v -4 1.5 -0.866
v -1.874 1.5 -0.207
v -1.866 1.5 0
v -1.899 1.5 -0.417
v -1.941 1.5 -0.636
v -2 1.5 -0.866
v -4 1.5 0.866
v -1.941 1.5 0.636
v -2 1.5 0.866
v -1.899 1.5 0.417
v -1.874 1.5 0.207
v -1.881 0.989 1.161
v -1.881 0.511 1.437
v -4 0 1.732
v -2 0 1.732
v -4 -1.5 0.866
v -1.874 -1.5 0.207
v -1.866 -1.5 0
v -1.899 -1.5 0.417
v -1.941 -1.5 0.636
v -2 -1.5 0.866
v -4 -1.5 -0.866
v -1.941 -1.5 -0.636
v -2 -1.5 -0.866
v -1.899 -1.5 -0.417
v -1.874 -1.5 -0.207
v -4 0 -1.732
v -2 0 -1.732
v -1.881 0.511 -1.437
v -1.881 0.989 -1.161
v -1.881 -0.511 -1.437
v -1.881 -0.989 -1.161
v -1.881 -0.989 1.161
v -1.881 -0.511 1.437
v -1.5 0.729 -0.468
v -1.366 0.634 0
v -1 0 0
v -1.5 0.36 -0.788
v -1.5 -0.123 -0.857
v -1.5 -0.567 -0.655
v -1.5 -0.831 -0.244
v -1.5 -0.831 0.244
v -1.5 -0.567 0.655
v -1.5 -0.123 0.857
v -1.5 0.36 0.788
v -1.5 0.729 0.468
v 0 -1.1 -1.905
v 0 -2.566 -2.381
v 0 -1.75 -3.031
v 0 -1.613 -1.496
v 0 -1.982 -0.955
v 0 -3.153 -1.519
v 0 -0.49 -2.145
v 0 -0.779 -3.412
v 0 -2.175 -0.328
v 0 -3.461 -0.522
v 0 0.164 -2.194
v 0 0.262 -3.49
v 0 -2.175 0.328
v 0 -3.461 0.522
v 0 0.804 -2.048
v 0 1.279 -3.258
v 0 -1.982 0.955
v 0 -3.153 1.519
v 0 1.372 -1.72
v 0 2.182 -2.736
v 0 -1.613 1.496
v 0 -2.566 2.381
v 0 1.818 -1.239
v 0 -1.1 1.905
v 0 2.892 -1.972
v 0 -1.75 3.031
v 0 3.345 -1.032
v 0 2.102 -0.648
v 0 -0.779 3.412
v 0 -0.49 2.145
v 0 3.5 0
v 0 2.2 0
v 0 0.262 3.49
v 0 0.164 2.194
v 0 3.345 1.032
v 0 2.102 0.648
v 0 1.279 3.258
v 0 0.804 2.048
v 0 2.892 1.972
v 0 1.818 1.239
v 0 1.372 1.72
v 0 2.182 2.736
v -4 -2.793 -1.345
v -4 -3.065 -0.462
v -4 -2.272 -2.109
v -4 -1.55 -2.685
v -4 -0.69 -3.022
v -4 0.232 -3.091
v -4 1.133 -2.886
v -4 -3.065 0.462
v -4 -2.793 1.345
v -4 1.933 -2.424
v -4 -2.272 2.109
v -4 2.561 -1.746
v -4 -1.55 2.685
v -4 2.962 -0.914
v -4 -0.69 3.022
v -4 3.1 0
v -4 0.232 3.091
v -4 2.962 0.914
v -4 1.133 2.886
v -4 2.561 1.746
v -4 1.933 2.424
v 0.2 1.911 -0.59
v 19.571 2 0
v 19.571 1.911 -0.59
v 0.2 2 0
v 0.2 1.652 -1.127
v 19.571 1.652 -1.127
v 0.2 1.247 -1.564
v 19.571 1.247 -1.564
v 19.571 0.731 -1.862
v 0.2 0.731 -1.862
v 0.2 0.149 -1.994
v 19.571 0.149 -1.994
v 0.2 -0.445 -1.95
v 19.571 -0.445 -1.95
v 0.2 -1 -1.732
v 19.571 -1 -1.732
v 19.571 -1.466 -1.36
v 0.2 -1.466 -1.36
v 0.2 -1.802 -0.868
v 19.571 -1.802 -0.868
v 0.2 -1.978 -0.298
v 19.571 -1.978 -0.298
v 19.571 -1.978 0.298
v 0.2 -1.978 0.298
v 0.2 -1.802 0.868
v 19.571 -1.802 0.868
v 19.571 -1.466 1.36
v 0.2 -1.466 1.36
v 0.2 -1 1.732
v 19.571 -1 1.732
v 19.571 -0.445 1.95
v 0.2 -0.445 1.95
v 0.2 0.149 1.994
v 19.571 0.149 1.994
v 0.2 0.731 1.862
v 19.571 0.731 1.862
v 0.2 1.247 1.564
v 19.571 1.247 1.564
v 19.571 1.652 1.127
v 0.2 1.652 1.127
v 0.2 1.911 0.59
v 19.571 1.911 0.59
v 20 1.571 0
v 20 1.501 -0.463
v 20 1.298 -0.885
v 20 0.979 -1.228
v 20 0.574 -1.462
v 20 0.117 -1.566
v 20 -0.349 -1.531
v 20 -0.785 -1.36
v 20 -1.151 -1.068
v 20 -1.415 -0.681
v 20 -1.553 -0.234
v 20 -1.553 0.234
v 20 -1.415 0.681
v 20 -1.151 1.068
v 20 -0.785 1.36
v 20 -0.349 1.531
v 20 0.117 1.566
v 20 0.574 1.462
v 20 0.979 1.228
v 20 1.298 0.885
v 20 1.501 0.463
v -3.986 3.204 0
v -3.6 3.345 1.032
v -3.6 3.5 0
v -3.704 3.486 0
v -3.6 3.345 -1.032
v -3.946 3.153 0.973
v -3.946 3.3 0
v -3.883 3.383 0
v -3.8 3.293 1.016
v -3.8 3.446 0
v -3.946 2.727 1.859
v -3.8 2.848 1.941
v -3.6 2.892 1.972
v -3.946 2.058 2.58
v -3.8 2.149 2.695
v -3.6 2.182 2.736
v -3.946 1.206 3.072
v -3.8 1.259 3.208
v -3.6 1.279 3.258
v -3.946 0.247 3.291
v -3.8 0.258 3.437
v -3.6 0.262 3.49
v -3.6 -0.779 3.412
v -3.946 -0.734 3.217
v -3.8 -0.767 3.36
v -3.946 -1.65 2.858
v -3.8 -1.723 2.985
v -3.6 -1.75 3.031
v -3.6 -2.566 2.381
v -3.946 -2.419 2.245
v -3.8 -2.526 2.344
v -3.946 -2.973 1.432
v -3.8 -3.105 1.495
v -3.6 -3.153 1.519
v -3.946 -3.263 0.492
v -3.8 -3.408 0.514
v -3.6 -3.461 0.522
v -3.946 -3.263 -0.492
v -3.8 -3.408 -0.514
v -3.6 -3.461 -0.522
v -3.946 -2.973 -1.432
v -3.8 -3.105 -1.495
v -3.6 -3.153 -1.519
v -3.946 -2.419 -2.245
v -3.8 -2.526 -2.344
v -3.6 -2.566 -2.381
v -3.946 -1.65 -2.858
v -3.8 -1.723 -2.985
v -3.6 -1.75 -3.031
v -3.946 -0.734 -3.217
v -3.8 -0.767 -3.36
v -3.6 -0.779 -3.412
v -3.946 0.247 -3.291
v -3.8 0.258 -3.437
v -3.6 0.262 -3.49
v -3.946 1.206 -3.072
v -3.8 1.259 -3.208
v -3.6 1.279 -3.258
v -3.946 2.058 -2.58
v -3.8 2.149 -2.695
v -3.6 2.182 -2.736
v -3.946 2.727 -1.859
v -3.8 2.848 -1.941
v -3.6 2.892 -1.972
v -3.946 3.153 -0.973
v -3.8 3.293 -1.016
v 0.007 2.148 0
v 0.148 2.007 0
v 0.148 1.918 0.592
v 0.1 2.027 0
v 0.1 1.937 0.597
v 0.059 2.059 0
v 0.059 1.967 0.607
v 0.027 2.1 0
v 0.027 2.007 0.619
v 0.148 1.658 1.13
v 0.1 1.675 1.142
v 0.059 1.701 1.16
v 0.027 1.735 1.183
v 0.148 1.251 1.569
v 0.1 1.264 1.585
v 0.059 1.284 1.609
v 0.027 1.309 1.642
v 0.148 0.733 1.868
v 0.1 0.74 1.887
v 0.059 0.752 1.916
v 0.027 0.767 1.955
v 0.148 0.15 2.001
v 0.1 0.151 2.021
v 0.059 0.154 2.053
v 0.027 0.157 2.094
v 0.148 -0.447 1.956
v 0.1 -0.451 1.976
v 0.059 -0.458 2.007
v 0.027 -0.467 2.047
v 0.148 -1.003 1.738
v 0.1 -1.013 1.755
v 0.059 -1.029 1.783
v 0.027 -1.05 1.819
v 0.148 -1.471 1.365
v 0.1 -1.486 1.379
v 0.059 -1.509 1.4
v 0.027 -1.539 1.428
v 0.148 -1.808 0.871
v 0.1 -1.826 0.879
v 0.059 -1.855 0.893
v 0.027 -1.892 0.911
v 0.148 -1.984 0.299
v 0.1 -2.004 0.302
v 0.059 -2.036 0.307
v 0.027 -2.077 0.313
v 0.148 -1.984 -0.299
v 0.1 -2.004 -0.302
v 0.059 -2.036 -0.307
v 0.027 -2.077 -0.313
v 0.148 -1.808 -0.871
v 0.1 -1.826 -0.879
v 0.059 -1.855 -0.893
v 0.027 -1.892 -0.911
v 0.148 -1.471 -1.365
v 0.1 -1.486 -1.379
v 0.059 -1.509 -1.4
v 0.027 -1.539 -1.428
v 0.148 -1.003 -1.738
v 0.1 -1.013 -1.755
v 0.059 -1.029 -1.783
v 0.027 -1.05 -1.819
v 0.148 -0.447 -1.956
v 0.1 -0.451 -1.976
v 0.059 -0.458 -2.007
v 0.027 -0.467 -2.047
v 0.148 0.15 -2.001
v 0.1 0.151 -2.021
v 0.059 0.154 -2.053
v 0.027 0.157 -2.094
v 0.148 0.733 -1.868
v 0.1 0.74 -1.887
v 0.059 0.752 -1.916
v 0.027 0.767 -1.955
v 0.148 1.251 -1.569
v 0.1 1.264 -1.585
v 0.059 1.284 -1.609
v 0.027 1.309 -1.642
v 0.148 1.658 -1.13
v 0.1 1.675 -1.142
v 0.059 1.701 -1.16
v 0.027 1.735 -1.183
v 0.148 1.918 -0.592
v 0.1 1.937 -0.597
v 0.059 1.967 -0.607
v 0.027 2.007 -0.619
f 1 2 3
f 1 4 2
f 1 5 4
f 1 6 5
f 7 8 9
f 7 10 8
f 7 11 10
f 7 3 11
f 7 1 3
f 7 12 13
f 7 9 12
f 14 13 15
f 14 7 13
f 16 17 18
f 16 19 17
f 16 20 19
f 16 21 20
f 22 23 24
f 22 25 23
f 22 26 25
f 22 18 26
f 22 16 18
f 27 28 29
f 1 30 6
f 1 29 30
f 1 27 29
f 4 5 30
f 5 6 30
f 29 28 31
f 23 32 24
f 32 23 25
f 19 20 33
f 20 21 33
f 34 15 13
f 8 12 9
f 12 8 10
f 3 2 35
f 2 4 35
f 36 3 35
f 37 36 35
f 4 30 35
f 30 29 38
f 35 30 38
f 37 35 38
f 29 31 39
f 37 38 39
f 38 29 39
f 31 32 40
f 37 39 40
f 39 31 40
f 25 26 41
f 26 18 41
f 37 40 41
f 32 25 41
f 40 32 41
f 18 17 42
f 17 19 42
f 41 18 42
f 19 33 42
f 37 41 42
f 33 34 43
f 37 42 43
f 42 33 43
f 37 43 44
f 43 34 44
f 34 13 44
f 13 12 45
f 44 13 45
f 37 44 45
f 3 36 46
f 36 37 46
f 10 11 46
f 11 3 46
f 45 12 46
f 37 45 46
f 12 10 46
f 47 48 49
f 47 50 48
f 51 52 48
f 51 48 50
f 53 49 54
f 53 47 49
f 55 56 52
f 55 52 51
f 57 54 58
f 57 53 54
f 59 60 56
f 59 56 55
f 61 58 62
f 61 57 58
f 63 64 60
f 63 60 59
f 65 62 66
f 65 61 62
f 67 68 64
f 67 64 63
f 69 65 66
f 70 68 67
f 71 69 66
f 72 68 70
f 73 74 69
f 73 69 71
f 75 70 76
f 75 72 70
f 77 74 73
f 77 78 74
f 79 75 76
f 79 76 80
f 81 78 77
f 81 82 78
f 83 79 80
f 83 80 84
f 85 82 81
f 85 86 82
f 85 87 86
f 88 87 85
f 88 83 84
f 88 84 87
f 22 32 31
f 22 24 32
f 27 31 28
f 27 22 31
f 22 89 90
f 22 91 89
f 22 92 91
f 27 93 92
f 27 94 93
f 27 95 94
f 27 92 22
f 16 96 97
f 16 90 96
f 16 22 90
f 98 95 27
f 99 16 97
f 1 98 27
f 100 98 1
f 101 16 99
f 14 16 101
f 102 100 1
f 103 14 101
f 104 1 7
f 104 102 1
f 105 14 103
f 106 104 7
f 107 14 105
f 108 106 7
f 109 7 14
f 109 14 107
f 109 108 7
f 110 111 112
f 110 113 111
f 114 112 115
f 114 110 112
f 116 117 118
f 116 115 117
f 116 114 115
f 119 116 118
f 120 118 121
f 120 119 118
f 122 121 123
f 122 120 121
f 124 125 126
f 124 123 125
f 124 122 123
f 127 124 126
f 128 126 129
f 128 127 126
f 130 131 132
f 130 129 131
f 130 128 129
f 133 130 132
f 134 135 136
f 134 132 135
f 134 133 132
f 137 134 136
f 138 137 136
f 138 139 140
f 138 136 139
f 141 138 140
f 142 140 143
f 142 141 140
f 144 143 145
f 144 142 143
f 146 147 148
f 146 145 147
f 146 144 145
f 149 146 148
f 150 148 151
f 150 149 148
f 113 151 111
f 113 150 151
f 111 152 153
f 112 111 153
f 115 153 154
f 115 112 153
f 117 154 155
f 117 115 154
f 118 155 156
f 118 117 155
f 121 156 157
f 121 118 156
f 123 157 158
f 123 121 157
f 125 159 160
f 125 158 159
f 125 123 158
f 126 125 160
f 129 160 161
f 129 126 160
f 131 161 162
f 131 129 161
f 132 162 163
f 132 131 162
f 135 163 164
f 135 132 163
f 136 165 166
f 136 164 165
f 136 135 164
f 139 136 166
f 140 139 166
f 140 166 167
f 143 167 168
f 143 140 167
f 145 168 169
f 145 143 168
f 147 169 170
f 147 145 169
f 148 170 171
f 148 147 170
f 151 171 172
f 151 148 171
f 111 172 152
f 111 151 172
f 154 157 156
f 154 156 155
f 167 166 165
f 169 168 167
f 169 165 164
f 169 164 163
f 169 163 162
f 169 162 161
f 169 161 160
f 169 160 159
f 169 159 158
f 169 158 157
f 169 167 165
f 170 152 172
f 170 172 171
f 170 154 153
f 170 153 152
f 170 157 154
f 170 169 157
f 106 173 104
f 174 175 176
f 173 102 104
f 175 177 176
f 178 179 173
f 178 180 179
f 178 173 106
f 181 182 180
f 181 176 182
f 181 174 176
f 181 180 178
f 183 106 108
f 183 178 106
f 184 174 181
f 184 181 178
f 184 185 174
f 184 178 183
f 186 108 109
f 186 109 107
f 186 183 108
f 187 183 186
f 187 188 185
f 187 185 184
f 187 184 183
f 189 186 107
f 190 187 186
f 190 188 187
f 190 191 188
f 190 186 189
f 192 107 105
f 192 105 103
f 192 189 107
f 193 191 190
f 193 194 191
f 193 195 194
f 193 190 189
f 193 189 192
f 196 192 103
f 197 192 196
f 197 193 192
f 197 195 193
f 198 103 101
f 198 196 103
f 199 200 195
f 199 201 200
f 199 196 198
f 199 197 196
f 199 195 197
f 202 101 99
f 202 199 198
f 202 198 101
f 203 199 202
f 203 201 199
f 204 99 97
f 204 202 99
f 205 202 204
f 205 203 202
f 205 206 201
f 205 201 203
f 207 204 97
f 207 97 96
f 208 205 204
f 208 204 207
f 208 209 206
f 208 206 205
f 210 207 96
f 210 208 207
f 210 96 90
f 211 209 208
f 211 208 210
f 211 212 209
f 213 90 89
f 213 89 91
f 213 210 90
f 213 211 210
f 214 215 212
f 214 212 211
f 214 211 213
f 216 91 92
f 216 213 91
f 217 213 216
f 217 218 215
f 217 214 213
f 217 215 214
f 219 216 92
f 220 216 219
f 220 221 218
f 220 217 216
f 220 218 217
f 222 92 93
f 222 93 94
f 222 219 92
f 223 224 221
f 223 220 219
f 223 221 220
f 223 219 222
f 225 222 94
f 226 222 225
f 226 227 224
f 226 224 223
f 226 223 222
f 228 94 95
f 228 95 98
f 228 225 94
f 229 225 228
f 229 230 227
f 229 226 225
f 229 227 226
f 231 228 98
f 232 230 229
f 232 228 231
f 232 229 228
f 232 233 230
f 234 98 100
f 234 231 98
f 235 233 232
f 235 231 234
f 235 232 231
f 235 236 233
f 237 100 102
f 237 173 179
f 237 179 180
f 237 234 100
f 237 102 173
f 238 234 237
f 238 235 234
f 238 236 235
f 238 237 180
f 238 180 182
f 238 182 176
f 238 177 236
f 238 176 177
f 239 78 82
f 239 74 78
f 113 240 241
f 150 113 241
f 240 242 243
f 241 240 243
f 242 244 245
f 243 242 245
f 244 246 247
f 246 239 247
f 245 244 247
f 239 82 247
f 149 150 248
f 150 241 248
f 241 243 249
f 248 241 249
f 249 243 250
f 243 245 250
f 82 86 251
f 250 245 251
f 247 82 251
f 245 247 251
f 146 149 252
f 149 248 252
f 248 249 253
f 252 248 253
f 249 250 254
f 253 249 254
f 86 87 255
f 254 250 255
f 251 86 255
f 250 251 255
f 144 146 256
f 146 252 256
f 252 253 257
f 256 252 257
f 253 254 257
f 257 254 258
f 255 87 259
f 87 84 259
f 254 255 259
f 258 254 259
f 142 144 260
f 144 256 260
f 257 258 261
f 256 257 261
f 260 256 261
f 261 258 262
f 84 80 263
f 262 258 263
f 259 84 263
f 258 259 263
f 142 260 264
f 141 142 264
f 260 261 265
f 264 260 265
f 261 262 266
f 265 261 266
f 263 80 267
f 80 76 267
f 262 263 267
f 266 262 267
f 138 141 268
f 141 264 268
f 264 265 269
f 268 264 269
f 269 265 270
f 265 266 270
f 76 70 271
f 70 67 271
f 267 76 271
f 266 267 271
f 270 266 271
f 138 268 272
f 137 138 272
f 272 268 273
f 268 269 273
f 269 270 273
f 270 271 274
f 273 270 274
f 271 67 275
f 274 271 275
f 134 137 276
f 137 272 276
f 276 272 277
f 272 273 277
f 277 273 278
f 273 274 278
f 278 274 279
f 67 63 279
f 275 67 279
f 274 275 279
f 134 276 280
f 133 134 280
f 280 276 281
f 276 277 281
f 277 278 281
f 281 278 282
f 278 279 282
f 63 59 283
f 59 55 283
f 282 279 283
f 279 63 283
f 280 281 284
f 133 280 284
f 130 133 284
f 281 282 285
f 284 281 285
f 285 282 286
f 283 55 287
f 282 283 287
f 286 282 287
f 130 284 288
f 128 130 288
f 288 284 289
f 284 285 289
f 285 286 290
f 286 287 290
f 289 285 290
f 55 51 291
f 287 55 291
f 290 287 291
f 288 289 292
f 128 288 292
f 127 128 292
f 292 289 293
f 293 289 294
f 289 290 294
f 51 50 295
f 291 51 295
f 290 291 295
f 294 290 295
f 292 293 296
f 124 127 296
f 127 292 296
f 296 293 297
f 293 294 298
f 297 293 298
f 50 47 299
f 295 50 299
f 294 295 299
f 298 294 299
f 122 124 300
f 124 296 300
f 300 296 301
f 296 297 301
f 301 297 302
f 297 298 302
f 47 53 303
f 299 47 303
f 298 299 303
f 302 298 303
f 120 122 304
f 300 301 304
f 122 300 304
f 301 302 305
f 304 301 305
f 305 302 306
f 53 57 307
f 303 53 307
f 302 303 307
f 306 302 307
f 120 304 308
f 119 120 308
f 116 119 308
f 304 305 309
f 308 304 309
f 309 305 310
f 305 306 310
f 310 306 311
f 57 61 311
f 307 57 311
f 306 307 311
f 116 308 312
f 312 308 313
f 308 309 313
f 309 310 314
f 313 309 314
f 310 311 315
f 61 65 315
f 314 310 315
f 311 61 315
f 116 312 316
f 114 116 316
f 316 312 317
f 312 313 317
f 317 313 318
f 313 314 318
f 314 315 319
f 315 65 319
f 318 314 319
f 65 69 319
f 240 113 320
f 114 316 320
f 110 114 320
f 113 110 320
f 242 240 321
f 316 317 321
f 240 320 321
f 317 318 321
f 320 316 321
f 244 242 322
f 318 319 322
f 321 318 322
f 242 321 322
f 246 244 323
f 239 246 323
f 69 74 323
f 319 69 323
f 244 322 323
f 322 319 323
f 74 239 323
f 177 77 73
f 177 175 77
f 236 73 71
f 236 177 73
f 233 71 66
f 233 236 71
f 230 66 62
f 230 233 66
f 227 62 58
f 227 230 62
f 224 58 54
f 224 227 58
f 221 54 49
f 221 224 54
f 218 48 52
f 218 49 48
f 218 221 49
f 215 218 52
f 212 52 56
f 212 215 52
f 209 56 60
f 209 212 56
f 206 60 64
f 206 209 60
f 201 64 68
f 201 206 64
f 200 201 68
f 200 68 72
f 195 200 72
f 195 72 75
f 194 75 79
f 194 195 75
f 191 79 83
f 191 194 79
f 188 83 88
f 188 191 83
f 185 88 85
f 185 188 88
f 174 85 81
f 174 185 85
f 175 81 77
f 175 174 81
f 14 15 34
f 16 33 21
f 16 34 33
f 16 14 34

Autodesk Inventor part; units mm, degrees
ref_plane "YZ Plane" through (0, 0, 0) normal (1, 0, 0) x (0, 1, 0)
ref_plane "XZ Plane" through (0, 0, 0) normal (0, 1, 0) x (-1, 0, 0)
sketch "Skizze1" plane through (0, 0, 0) normal (0, 0, 1) x (1, 0, 0)
  line L0 (-1, 0) -> (20, 0)
  line L1 (20, 0) -> (20, 2)
  line L2 (20, 2) -> (1.75, 2)
  line L3 (1.75, 2) -> (1.3205, 2)
  line L4 (1.3205, 2) -> (0, 2)
  line L5 (0, 2) -> (0, 3.5)
  line L6 (0, 3.5) -> (-4, 3.5)
  line L7 (-4, 3.5) -> (-4, 1.7321)
  line L8 (-4, 1.7321) -> (-2, 1.7321)
  line L9 (-2, 1.7321) -> (-1, 0)
  line L10 (-8.8, 0) -> (24.8, 0) projected
  line L11 (0, -0.7) -> (0, 4.2) projected
  line L12 (1.75, 2) -> (0, 2) construction
  dimension "d1" = 18.25
  dimension "d2" = 0.4295
  dimension "d3" = 4
  dimension "d4" = 2
  dimension "d5" = 60
  dimension "d6" = 4
  dimension "d7" = 4
  dimension "d8" = 3.4641
  dimension "d9" = 7
  dimension "d26" = 20
revolve "Körper" add sketch "Skizze1" angle 360 about axis through (-1, 0, 0) along (1, 0, 0)
sketch "Skizze2" plane through (-4, 0, 0) normal (-1, 0, 0) x (0, 0, 1)
  circle A0 centre (0, 0) radius 1.7321 projected
  line L0 (0, -4.9) -> (0, 4.9) projected
  line L1 (-4.9, 0) -> (4.9, 0) projected
  line L2 (1.7321, 0) -> (0.866, -1.5)
  line L3 (0.866, -1.5) -> (-0.866, -1.5)
  line L4 (-0.866, -1.5) -> (-1.7321, 0)
  line L5 (-1.7321, 0) -> (-0.866, 1.5)
  line L6 (-0.866, 1.5) -> (0.866, 1.5)
  line L7 (0.866, 1.5) -> (1.7321, 0)
extrude "Loch" add sketch "Skizze2" against normal up to next contours L7 A0 | A0 L2 | L6 L0 A0 | A0 L0 L3 | L0 L6 A0 | A0 L3 L0 | L4 A0 | A0 L5
fillet "Rundung1" radius 0.4 1 edges at (-4, -3.5, 0)
thread "Gewinde" size "M4x0.7" class "6g" standard "ISO Metric profile" length 18.25
chamfer "Fase1" distance 0.4294 distance2 0.4294 1 edges at (20, -2, 0) measured on face at (20, 0.0679, 1.2634)
ref_plane "Work Plane1" through (29, 0, 0) normal (0, -1, 0) x (1, 0, 0)
fillet "Fillet2" radius 0.2 1 edges at (0, -2, 0)
equation "\"d1\" = GEL"
equation "\"d3\" = KOH"
equation "\"d4\" = INTI"
equation "\"d6\" = GD"
equation "\"d7\" = BDM"
equation "\"d8\" = 1.1547 * SW"
equation "\"d9\" = KOD"
equation "\"d26\" = NLG"
equation "\"d30\" = R"
equation "\"d17\" = RR"
equation "\"d13\" = GEL"
equation "\"d15\" = -0.5 * SPD + 0.5 * GD"
equation "\"d16\" = GUL"
equation "\"GD\" = NND"
equation "\"NLG\" = 20"
equation "\"GEL\" = 18.25"
equation "\"KOD\" = 7"
equation "\"KOH\" = 4"
equation "\"INTI\" = 2"
equation "\"GAL\" = 0.61345 * PTC"
equation "\"GUL\" = 0.61345 * PTC"
equation "\"BDM\" = NND"
equation "\"SW\" = 3"
equation "\"RR\" = 0.4"
equation "\"SPD\" = NND - 1.2269 * PTC"
equation "\"R\" = 0.2"
equation "\"TOA\" = 30deg"
equation "\"GD1\" = THREADDIA - 1.2269 * PTC"
equation "\"THREADDIA\" = 4"
equation "\"FAWI\" = 45deg"
equation "\"ANG\" = 120deg"
equation "\"PTC\" = 0.7"
equation "\"NND\" = 4"
equation "\"E0\" = 1.155 * SW"
properties part number "DIN 912 - M4 x 20" material "Stahl, weich"
